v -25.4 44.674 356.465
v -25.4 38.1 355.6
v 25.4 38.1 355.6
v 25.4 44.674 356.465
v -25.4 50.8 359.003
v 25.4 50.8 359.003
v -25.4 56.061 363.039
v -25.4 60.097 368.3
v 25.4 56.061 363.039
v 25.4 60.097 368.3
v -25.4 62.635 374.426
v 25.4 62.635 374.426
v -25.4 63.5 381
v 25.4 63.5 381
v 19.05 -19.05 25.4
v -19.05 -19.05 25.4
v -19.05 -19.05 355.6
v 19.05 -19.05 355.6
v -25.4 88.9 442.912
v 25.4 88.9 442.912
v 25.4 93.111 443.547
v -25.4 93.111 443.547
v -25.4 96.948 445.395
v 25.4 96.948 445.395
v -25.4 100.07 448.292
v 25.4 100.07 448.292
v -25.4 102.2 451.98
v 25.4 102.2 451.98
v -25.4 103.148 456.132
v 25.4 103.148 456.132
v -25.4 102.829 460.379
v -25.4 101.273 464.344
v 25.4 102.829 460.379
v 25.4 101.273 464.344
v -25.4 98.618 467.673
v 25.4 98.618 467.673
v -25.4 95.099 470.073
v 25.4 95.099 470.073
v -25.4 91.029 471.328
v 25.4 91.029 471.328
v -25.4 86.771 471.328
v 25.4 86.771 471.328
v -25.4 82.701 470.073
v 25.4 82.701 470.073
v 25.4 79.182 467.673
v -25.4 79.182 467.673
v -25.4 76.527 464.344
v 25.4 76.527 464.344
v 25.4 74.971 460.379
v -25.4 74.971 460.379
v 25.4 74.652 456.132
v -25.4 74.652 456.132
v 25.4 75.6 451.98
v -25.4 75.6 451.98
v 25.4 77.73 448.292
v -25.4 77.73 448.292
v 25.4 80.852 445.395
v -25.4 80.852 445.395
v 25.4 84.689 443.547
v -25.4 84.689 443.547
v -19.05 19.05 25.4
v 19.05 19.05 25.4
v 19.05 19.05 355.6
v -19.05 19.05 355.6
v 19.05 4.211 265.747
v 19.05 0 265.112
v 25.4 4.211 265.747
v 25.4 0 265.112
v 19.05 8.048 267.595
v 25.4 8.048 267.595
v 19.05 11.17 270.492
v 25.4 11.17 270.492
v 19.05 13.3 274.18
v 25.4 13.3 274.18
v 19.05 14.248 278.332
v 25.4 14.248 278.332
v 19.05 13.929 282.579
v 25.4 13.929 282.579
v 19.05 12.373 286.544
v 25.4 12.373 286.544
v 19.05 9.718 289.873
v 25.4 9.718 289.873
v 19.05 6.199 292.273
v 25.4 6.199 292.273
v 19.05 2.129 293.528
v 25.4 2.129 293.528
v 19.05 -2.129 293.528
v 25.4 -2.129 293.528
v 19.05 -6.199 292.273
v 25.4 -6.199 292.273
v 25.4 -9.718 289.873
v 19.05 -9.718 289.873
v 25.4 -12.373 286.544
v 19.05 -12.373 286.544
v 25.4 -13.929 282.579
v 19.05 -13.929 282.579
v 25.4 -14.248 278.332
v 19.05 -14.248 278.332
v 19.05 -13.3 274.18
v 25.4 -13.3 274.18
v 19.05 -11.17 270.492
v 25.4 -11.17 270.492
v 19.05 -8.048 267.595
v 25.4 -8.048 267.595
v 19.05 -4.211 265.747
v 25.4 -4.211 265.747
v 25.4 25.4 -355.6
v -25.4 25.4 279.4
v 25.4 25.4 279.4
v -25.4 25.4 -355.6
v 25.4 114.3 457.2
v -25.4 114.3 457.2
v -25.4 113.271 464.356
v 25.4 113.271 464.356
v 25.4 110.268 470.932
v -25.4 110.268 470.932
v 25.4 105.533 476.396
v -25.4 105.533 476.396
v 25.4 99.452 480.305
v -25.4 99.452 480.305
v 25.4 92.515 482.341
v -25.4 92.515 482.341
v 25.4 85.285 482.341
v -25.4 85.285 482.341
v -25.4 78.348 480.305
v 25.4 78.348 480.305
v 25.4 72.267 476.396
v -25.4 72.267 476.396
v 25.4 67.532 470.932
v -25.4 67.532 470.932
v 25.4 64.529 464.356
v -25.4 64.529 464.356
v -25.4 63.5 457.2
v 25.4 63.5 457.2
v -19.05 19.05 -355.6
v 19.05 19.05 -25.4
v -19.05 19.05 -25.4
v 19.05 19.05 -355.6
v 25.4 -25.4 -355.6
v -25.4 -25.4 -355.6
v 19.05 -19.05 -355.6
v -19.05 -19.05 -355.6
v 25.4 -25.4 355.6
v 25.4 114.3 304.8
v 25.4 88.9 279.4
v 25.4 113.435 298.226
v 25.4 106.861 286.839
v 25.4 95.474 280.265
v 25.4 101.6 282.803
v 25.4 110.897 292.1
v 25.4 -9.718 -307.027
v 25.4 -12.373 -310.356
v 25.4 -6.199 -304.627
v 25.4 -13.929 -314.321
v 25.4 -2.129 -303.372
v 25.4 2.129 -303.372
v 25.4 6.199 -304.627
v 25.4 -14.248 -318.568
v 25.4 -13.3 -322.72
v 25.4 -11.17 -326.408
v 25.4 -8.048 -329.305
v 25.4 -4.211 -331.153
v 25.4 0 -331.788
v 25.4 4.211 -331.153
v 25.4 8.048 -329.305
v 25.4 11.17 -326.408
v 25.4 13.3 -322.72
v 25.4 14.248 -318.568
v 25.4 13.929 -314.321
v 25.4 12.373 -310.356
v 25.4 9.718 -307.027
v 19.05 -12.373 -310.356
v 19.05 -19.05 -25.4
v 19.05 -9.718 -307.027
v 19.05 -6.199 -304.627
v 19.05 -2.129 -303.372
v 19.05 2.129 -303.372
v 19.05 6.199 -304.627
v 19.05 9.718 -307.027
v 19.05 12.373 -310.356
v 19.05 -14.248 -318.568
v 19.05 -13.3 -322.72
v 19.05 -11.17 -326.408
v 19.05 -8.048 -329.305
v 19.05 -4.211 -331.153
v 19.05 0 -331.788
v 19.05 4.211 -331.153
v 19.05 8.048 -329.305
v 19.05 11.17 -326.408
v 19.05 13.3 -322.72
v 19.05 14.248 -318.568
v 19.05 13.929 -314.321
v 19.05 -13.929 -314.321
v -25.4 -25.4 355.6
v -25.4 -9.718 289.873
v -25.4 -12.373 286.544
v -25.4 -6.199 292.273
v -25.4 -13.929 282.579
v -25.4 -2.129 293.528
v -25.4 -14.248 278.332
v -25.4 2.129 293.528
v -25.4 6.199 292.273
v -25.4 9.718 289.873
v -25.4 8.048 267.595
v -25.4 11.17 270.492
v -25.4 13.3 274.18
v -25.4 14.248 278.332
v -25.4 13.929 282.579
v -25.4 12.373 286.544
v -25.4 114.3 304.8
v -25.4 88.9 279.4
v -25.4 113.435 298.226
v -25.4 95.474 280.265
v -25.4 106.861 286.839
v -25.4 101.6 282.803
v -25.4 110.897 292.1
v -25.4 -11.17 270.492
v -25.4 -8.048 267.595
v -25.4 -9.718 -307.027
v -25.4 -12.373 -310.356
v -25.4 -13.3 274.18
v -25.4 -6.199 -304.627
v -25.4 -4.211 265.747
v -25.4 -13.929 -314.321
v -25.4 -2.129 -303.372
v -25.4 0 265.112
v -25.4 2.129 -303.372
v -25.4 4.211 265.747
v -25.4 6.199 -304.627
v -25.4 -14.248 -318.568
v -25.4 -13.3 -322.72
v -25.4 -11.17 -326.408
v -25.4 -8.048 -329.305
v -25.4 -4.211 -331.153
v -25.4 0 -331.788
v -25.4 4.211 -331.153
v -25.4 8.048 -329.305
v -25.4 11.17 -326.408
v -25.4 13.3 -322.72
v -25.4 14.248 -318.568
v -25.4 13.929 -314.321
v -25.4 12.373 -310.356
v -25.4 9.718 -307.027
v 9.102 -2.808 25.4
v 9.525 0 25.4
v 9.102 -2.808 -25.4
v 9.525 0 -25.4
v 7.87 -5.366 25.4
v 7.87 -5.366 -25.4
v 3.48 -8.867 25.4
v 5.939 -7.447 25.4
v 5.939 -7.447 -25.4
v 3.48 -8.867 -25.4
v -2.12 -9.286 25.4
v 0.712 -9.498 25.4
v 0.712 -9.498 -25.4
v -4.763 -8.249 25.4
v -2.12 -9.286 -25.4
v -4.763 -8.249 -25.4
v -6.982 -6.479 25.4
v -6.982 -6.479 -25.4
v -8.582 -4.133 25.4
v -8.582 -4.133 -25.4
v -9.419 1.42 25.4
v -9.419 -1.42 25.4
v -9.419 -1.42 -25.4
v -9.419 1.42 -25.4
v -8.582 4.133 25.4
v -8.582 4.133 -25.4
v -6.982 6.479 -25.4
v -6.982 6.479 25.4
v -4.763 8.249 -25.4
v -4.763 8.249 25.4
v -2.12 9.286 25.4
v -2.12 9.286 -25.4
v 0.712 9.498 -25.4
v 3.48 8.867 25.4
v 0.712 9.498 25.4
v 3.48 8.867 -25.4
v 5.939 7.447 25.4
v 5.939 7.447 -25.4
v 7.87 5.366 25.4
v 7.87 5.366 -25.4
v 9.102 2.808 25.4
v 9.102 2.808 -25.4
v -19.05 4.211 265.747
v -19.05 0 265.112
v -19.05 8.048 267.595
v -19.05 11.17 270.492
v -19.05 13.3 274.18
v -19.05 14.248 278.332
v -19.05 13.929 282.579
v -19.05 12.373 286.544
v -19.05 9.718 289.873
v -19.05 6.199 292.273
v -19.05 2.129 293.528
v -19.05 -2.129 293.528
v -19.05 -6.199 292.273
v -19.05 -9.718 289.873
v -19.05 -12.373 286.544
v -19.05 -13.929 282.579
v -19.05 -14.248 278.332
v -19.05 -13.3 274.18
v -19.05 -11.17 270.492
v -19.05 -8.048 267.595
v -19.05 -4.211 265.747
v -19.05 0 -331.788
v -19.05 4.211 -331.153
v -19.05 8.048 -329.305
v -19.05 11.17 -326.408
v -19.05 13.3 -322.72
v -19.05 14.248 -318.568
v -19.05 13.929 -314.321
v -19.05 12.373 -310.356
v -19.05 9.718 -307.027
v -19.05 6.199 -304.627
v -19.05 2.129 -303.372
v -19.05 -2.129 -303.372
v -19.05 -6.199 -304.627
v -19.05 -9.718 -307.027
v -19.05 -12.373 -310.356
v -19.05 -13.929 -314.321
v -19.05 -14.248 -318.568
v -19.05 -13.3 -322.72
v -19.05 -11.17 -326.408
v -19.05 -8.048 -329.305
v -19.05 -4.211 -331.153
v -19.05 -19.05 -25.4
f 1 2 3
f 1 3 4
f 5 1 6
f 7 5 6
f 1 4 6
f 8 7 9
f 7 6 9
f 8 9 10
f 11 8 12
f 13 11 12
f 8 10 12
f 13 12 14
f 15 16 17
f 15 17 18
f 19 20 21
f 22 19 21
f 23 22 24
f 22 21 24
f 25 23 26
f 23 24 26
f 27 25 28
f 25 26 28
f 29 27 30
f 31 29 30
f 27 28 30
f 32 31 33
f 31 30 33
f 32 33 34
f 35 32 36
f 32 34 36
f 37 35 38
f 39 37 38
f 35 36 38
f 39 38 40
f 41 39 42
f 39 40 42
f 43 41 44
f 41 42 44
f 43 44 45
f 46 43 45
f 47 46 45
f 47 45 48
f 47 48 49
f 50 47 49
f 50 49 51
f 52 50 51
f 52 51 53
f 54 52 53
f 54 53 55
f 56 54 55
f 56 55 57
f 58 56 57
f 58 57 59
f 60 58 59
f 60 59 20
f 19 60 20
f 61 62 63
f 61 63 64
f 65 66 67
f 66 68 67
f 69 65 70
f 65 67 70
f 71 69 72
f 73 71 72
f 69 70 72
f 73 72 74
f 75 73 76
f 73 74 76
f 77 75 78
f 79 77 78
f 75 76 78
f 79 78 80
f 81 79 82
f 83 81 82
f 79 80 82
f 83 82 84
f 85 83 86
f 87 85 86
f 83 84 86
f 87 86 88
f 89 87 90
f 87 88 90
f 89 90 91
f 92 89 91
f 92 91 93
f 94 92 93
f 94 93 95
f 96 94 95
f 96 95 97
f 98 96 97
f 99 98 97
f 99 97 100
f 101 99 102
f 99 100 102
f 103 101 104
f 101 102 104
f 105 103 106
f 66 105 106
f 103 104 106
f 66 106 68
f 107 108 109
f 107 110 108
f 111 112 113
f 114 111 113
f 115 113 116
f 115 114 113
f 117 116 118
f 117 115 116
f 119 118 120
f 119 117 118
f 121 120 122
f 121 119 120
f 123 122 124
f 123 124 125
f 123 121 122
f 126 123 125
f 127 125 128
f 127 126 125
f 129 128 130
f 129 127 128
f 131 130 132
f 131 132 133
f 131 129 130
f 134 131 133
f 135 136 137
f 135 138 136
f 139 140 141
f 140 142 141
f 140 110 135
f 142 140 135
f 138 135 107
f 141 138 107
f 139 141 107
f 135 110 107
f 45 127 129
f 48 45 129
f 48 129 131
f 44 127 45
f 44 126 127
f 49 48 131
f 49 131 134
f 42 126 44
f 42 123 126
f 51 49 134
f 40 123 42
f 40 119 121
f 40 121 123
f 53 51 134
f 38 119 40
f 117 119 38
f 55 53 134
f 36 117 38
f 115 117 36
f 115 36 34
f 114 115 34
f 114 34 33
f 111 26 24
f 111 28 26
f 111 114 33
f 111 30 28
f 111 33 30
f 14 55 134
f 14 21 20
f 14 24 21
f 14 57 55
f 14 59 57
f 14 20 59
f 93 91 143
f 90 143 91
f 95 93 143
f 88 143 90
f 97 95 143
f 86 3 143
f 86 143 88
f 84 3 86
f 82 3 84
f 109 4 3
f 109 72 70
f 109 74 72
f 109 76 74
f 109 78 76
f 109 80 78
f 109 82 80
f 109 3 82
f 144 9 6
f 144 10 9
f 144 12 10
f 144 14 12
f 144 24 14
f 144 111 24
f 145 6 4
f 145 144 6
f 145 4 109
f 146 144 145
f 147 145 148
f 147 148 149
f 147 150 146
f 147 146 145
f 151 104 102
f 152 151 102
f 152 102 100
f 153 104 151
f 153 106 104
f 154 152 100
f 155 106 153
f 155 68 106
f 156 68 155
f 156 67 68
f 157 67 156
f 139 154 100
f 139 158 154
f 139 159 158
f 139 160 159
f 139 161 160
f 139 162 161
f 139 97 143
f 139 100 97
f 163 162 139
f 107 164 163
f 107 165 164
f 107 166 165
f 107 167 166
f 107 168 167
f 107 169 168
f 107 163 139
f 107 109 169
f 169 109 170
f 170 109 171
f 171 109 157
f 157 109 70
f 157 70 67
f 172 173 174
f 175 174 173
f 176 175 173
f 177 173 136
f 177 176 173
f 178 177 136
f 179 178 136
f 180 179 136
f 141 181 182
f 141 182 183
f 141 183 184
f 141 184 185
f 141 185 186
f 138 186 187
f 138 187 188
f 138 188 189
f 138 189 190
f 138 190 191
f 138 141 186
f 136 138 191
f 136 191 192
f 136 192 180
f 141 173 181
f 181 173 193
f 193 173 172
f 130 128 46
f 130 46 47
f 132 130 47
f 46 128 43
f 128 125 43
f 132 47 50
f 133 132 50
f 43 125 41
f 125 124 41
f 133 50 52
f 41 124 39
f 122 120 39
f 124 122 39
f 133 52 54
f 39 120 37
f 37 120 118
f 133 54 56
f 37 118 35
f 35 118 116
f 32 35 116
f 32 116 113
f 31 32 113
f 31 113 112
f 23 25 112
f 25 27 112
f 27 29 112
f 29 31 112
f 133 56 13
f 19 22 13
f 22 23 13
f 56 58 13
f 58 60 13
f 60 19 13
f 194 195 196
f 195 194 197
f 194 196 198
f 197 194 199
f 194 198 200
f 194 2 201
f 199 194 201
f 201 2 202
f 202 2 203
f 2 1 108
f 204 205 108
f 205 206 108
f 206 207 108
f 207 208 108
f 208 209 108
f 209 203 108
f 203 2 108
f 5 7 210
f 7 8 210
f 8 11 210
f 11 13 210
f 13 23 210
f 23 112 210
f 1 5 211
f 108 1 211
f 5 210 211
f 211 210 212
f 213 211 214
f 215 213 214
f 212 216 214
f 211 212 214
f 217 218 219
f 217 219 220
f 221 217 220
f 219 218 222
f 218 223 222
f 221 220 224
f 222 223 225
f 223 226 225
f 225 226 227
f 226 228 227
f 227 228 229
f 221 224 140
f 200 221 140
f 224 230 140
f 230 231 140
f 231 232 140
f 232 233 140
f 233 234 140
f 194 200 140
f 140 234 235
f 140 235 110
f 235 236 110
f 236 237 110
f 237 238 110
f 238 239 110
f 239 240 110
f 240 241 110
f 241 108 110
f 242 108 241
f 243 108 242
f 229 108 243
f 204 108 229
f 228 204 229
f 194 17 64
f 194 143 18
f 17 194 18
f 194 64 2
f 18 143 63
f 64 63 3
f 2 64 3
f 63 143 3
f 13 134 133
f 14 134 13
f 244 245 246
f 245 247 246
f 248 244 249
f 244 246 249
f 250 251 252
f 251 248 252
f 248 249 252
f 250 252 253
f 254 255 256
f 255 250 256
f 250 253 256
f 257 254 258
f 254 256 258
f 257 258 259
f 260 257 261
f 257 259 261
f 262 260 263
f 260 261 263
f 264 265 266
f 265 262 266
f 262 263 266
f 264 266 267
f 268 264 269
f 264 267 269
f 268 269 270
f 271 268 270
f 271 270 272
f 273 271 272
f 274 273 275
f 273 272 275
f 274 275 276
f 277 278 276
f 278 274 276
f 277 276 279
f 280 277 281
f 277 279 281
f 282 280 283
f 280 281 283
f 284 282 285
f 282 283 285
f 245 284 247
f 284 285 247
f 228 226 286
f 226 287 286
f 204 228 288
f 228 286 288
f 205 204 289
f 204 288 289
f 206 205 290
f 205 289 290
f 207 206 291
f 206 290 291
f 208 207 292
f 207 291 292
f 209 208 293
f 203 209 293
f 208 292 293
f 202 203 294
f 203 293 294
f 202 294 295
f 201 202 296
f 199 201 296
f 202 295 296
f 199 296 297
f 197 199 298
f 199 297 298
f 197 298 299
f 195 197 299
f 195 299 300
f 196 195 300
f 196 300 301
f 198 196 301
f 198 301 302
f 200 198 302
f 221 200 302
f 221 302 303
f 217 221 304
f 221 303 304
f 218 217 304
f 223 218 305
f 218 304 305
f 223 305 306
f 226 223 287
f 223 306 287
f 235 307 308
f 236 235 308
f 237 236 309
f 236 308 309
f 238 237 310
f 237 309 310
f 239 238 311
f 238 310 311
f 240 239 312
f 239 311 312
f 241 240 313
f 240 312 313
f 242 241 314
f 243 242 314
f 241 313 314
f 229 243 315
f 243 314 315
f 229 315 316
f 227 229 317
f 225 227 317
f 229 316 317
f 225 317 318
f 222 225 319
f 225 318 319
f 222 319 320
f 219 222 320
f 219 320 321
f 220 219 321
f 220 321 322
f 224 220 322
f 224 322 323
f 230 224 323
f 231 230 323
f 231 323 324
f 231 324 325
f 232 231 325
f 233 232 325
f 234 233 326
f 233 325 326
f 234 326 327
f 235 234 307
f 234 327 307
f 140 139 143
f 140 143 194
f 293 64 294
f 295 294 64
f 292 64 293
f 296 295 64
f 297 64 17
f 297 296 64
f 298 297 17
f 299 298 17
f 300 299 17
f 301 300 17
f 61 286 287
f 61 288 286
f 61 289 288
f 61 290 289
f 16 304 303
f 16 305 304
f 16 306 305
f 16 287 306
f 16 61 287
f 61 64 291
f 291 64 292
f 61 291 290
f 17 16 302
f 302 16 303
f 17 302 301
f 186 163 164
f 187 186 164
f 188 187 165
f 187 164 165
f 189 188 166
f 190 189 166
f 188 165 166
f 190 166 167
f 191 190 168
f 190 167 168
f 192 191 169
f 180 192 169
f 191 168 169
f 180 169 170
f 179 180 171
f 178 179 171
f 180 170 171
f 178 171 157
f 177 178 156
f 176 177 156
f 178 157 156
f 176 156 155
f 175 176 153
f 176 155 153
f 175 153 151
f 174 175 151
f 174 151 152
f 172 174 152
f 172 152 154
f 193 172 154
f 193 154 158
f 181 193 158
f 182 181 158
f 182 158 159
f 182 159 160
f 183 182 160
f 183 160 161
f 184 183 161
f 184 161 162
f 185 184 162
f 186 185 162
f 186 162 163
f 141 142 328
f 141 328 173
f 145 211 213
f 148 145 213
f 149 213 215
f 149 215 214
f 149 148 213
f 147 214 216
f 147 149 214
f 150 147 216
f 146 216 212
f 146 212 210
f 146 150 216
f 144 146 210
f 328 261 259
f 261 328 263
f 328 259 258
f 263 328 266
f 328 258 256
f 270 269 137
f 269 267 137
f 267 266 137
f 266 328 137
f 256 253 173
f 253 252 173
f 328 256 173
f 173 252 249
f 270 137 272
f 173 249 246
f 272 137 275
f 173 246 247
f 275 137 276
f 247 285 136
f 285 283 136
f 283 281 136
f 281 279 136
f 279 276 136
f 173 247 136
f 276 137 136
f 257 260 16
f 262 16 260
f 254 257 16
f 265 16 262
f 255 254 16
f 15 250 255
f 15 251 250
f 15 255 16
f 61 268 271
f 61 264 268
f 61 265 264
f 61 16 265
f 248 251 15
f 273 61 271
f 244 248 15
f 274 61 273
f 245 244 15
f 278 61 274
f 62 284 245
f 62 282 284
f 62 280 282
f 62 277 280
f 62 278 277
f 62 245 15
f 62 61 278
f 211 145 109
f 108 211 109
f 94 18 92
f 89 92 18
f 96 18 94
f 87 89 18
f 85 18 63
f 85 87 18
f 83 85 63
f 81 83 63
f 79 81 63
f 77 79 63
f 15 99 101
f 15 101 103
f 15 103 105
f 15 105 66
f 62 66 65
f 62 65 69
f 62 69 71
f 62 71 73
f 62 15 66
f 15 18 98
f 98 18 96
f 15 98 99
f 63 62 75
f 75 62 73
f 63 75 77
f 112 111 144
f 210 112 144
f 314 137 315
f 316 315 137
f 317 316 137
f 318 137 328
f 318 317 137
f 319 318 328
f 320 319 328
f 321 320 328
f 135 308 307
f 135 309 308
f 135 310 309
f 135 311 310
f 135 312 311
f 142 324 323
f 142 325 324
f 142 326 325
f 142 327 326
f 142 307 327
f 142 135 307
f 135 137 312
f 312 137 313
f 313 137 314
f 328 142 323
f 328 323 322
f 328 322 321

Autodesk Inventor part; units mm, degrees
ref_plane "YZ Plane" through (0, 0, 0) normal (1, 0, 0) x (0, 1, 0)
ref_plane "XZ Plane" through (0, 0, 0) normal (0, 1, 0) x (-1, 0, 0)
ref_plane "XY Plane" through (0, 0, 0) normal (0, 0, 1) x (1, 0, 0)
sketch "Sketch1" plane through (0, 0, 0) normal (0, 0, 1) x (1, 0, 0)
  line L0 (-25.4, 25.4) -> (25.4, 25.4)
  line L1 (25.4, 25.4) -> (25.4, -25.4)
  line L2 (25.4, -25.4) -> (-25.4, -25.4)
  line L3 (-25.4, -25.4) -> (-25.4, 25.4)
  line L4 (19.05, 19.05) -> (-19.05, 19.05)
  line L5 (-19.05, 19.05) -> (-19.05, -19.05)
  line L6 (-19.05, -19.05) -> (19.05, -19.05)
  line L7 (19.05, -19.05) -> (19.05, 19.05)
  circle A0 centre (0, 0) radius 9.525
  point P0 (0, 25.4)
  point P1 (-25.4, 0)
  dimension "d0" = 50.8
  dimension "d1" = 50.8
  dimension "d2" = 6.35
  dimension "d20" = 19.05
extrude "Extrusion1" add sketch "Sketch1" along normal mid plane 711.2 contours L0 L1 L2 L3
extrude "Extrusion4" add sketch "Sketch1" along normal mid plane 50.8 contours L7 L6 L5 L4
sketch "Sketch2" plane through (25.4, -25.4, 355.6) normal (1, 0, 0) x (0, 0, -1)
  line L0 (711.2, 0) -> (711.2, 50.8) projected
  circle A0 centre (673.1, 25.4) radius 14.2875
  line L1 (0, 50.8) -> (0, 0) projected
  circle A1 centre (76.2, 25.4) radius 14.2875
  point P0 (355.6, 25.4)
  point P1 (711.2, 25.4)
  point P2 (0, 25.4)
  dimension "d5" = 28.575
  dimension "d6" = 38.1
  dimension "d18" = 76.2
extrude "Extrusion2" cut sketch "Sketch2" against normal up to surface (50.8 mm away)
sketch "Sketch3" plane through (25.4, -25.4, 355.6) normal (1, 0, 0) x (0, 0, -1)
  line L0 (0, 0) -> (711.2, 0) projected
  line L1 (0, 50.8) -> (711.2, 50.8) projected
  arc A0 (-101.6, 139.7) -> (-101.6, 88.9) centre (-101.6, 114.3) ccw
  circle A1 centre (-101.6, 114.3) radius 14.2875
  line L2 (-101.6, 88.9) -> (-25.4, 88.9)
  line L3 (-101.6, 139.7) -> (50.8, 139.7)
  line L4 (0, 50.8) -> (0, 63.5)
  line L5 (76.2, 114.3) -> (76.2, 50.8)
  arc A2 (76.2, 114.3) -> (50.8, 139.7) centre (50.8, 114.3) ccw
  arc A3 (0, 63.5) -> (-25.4, 88.9) centre (-25.4, 63.5) ccw
  point P0 (355.6, 25.4)
  point P1 (0, 88.9)
  point P2 (76.2, 139.7)
  dimension "d9" = 28.575
  dimension "d10" = 25.4
  dimension "d11" = 101.6
  dimension "d12" = 76.2
  dimension "d13" = 38.1
  dimension "d14" = 25.4
extrude "Extrusion3" add sketch "Sketch3" against normal up to surface (50.8 mm away)
properties part number "Arm"
